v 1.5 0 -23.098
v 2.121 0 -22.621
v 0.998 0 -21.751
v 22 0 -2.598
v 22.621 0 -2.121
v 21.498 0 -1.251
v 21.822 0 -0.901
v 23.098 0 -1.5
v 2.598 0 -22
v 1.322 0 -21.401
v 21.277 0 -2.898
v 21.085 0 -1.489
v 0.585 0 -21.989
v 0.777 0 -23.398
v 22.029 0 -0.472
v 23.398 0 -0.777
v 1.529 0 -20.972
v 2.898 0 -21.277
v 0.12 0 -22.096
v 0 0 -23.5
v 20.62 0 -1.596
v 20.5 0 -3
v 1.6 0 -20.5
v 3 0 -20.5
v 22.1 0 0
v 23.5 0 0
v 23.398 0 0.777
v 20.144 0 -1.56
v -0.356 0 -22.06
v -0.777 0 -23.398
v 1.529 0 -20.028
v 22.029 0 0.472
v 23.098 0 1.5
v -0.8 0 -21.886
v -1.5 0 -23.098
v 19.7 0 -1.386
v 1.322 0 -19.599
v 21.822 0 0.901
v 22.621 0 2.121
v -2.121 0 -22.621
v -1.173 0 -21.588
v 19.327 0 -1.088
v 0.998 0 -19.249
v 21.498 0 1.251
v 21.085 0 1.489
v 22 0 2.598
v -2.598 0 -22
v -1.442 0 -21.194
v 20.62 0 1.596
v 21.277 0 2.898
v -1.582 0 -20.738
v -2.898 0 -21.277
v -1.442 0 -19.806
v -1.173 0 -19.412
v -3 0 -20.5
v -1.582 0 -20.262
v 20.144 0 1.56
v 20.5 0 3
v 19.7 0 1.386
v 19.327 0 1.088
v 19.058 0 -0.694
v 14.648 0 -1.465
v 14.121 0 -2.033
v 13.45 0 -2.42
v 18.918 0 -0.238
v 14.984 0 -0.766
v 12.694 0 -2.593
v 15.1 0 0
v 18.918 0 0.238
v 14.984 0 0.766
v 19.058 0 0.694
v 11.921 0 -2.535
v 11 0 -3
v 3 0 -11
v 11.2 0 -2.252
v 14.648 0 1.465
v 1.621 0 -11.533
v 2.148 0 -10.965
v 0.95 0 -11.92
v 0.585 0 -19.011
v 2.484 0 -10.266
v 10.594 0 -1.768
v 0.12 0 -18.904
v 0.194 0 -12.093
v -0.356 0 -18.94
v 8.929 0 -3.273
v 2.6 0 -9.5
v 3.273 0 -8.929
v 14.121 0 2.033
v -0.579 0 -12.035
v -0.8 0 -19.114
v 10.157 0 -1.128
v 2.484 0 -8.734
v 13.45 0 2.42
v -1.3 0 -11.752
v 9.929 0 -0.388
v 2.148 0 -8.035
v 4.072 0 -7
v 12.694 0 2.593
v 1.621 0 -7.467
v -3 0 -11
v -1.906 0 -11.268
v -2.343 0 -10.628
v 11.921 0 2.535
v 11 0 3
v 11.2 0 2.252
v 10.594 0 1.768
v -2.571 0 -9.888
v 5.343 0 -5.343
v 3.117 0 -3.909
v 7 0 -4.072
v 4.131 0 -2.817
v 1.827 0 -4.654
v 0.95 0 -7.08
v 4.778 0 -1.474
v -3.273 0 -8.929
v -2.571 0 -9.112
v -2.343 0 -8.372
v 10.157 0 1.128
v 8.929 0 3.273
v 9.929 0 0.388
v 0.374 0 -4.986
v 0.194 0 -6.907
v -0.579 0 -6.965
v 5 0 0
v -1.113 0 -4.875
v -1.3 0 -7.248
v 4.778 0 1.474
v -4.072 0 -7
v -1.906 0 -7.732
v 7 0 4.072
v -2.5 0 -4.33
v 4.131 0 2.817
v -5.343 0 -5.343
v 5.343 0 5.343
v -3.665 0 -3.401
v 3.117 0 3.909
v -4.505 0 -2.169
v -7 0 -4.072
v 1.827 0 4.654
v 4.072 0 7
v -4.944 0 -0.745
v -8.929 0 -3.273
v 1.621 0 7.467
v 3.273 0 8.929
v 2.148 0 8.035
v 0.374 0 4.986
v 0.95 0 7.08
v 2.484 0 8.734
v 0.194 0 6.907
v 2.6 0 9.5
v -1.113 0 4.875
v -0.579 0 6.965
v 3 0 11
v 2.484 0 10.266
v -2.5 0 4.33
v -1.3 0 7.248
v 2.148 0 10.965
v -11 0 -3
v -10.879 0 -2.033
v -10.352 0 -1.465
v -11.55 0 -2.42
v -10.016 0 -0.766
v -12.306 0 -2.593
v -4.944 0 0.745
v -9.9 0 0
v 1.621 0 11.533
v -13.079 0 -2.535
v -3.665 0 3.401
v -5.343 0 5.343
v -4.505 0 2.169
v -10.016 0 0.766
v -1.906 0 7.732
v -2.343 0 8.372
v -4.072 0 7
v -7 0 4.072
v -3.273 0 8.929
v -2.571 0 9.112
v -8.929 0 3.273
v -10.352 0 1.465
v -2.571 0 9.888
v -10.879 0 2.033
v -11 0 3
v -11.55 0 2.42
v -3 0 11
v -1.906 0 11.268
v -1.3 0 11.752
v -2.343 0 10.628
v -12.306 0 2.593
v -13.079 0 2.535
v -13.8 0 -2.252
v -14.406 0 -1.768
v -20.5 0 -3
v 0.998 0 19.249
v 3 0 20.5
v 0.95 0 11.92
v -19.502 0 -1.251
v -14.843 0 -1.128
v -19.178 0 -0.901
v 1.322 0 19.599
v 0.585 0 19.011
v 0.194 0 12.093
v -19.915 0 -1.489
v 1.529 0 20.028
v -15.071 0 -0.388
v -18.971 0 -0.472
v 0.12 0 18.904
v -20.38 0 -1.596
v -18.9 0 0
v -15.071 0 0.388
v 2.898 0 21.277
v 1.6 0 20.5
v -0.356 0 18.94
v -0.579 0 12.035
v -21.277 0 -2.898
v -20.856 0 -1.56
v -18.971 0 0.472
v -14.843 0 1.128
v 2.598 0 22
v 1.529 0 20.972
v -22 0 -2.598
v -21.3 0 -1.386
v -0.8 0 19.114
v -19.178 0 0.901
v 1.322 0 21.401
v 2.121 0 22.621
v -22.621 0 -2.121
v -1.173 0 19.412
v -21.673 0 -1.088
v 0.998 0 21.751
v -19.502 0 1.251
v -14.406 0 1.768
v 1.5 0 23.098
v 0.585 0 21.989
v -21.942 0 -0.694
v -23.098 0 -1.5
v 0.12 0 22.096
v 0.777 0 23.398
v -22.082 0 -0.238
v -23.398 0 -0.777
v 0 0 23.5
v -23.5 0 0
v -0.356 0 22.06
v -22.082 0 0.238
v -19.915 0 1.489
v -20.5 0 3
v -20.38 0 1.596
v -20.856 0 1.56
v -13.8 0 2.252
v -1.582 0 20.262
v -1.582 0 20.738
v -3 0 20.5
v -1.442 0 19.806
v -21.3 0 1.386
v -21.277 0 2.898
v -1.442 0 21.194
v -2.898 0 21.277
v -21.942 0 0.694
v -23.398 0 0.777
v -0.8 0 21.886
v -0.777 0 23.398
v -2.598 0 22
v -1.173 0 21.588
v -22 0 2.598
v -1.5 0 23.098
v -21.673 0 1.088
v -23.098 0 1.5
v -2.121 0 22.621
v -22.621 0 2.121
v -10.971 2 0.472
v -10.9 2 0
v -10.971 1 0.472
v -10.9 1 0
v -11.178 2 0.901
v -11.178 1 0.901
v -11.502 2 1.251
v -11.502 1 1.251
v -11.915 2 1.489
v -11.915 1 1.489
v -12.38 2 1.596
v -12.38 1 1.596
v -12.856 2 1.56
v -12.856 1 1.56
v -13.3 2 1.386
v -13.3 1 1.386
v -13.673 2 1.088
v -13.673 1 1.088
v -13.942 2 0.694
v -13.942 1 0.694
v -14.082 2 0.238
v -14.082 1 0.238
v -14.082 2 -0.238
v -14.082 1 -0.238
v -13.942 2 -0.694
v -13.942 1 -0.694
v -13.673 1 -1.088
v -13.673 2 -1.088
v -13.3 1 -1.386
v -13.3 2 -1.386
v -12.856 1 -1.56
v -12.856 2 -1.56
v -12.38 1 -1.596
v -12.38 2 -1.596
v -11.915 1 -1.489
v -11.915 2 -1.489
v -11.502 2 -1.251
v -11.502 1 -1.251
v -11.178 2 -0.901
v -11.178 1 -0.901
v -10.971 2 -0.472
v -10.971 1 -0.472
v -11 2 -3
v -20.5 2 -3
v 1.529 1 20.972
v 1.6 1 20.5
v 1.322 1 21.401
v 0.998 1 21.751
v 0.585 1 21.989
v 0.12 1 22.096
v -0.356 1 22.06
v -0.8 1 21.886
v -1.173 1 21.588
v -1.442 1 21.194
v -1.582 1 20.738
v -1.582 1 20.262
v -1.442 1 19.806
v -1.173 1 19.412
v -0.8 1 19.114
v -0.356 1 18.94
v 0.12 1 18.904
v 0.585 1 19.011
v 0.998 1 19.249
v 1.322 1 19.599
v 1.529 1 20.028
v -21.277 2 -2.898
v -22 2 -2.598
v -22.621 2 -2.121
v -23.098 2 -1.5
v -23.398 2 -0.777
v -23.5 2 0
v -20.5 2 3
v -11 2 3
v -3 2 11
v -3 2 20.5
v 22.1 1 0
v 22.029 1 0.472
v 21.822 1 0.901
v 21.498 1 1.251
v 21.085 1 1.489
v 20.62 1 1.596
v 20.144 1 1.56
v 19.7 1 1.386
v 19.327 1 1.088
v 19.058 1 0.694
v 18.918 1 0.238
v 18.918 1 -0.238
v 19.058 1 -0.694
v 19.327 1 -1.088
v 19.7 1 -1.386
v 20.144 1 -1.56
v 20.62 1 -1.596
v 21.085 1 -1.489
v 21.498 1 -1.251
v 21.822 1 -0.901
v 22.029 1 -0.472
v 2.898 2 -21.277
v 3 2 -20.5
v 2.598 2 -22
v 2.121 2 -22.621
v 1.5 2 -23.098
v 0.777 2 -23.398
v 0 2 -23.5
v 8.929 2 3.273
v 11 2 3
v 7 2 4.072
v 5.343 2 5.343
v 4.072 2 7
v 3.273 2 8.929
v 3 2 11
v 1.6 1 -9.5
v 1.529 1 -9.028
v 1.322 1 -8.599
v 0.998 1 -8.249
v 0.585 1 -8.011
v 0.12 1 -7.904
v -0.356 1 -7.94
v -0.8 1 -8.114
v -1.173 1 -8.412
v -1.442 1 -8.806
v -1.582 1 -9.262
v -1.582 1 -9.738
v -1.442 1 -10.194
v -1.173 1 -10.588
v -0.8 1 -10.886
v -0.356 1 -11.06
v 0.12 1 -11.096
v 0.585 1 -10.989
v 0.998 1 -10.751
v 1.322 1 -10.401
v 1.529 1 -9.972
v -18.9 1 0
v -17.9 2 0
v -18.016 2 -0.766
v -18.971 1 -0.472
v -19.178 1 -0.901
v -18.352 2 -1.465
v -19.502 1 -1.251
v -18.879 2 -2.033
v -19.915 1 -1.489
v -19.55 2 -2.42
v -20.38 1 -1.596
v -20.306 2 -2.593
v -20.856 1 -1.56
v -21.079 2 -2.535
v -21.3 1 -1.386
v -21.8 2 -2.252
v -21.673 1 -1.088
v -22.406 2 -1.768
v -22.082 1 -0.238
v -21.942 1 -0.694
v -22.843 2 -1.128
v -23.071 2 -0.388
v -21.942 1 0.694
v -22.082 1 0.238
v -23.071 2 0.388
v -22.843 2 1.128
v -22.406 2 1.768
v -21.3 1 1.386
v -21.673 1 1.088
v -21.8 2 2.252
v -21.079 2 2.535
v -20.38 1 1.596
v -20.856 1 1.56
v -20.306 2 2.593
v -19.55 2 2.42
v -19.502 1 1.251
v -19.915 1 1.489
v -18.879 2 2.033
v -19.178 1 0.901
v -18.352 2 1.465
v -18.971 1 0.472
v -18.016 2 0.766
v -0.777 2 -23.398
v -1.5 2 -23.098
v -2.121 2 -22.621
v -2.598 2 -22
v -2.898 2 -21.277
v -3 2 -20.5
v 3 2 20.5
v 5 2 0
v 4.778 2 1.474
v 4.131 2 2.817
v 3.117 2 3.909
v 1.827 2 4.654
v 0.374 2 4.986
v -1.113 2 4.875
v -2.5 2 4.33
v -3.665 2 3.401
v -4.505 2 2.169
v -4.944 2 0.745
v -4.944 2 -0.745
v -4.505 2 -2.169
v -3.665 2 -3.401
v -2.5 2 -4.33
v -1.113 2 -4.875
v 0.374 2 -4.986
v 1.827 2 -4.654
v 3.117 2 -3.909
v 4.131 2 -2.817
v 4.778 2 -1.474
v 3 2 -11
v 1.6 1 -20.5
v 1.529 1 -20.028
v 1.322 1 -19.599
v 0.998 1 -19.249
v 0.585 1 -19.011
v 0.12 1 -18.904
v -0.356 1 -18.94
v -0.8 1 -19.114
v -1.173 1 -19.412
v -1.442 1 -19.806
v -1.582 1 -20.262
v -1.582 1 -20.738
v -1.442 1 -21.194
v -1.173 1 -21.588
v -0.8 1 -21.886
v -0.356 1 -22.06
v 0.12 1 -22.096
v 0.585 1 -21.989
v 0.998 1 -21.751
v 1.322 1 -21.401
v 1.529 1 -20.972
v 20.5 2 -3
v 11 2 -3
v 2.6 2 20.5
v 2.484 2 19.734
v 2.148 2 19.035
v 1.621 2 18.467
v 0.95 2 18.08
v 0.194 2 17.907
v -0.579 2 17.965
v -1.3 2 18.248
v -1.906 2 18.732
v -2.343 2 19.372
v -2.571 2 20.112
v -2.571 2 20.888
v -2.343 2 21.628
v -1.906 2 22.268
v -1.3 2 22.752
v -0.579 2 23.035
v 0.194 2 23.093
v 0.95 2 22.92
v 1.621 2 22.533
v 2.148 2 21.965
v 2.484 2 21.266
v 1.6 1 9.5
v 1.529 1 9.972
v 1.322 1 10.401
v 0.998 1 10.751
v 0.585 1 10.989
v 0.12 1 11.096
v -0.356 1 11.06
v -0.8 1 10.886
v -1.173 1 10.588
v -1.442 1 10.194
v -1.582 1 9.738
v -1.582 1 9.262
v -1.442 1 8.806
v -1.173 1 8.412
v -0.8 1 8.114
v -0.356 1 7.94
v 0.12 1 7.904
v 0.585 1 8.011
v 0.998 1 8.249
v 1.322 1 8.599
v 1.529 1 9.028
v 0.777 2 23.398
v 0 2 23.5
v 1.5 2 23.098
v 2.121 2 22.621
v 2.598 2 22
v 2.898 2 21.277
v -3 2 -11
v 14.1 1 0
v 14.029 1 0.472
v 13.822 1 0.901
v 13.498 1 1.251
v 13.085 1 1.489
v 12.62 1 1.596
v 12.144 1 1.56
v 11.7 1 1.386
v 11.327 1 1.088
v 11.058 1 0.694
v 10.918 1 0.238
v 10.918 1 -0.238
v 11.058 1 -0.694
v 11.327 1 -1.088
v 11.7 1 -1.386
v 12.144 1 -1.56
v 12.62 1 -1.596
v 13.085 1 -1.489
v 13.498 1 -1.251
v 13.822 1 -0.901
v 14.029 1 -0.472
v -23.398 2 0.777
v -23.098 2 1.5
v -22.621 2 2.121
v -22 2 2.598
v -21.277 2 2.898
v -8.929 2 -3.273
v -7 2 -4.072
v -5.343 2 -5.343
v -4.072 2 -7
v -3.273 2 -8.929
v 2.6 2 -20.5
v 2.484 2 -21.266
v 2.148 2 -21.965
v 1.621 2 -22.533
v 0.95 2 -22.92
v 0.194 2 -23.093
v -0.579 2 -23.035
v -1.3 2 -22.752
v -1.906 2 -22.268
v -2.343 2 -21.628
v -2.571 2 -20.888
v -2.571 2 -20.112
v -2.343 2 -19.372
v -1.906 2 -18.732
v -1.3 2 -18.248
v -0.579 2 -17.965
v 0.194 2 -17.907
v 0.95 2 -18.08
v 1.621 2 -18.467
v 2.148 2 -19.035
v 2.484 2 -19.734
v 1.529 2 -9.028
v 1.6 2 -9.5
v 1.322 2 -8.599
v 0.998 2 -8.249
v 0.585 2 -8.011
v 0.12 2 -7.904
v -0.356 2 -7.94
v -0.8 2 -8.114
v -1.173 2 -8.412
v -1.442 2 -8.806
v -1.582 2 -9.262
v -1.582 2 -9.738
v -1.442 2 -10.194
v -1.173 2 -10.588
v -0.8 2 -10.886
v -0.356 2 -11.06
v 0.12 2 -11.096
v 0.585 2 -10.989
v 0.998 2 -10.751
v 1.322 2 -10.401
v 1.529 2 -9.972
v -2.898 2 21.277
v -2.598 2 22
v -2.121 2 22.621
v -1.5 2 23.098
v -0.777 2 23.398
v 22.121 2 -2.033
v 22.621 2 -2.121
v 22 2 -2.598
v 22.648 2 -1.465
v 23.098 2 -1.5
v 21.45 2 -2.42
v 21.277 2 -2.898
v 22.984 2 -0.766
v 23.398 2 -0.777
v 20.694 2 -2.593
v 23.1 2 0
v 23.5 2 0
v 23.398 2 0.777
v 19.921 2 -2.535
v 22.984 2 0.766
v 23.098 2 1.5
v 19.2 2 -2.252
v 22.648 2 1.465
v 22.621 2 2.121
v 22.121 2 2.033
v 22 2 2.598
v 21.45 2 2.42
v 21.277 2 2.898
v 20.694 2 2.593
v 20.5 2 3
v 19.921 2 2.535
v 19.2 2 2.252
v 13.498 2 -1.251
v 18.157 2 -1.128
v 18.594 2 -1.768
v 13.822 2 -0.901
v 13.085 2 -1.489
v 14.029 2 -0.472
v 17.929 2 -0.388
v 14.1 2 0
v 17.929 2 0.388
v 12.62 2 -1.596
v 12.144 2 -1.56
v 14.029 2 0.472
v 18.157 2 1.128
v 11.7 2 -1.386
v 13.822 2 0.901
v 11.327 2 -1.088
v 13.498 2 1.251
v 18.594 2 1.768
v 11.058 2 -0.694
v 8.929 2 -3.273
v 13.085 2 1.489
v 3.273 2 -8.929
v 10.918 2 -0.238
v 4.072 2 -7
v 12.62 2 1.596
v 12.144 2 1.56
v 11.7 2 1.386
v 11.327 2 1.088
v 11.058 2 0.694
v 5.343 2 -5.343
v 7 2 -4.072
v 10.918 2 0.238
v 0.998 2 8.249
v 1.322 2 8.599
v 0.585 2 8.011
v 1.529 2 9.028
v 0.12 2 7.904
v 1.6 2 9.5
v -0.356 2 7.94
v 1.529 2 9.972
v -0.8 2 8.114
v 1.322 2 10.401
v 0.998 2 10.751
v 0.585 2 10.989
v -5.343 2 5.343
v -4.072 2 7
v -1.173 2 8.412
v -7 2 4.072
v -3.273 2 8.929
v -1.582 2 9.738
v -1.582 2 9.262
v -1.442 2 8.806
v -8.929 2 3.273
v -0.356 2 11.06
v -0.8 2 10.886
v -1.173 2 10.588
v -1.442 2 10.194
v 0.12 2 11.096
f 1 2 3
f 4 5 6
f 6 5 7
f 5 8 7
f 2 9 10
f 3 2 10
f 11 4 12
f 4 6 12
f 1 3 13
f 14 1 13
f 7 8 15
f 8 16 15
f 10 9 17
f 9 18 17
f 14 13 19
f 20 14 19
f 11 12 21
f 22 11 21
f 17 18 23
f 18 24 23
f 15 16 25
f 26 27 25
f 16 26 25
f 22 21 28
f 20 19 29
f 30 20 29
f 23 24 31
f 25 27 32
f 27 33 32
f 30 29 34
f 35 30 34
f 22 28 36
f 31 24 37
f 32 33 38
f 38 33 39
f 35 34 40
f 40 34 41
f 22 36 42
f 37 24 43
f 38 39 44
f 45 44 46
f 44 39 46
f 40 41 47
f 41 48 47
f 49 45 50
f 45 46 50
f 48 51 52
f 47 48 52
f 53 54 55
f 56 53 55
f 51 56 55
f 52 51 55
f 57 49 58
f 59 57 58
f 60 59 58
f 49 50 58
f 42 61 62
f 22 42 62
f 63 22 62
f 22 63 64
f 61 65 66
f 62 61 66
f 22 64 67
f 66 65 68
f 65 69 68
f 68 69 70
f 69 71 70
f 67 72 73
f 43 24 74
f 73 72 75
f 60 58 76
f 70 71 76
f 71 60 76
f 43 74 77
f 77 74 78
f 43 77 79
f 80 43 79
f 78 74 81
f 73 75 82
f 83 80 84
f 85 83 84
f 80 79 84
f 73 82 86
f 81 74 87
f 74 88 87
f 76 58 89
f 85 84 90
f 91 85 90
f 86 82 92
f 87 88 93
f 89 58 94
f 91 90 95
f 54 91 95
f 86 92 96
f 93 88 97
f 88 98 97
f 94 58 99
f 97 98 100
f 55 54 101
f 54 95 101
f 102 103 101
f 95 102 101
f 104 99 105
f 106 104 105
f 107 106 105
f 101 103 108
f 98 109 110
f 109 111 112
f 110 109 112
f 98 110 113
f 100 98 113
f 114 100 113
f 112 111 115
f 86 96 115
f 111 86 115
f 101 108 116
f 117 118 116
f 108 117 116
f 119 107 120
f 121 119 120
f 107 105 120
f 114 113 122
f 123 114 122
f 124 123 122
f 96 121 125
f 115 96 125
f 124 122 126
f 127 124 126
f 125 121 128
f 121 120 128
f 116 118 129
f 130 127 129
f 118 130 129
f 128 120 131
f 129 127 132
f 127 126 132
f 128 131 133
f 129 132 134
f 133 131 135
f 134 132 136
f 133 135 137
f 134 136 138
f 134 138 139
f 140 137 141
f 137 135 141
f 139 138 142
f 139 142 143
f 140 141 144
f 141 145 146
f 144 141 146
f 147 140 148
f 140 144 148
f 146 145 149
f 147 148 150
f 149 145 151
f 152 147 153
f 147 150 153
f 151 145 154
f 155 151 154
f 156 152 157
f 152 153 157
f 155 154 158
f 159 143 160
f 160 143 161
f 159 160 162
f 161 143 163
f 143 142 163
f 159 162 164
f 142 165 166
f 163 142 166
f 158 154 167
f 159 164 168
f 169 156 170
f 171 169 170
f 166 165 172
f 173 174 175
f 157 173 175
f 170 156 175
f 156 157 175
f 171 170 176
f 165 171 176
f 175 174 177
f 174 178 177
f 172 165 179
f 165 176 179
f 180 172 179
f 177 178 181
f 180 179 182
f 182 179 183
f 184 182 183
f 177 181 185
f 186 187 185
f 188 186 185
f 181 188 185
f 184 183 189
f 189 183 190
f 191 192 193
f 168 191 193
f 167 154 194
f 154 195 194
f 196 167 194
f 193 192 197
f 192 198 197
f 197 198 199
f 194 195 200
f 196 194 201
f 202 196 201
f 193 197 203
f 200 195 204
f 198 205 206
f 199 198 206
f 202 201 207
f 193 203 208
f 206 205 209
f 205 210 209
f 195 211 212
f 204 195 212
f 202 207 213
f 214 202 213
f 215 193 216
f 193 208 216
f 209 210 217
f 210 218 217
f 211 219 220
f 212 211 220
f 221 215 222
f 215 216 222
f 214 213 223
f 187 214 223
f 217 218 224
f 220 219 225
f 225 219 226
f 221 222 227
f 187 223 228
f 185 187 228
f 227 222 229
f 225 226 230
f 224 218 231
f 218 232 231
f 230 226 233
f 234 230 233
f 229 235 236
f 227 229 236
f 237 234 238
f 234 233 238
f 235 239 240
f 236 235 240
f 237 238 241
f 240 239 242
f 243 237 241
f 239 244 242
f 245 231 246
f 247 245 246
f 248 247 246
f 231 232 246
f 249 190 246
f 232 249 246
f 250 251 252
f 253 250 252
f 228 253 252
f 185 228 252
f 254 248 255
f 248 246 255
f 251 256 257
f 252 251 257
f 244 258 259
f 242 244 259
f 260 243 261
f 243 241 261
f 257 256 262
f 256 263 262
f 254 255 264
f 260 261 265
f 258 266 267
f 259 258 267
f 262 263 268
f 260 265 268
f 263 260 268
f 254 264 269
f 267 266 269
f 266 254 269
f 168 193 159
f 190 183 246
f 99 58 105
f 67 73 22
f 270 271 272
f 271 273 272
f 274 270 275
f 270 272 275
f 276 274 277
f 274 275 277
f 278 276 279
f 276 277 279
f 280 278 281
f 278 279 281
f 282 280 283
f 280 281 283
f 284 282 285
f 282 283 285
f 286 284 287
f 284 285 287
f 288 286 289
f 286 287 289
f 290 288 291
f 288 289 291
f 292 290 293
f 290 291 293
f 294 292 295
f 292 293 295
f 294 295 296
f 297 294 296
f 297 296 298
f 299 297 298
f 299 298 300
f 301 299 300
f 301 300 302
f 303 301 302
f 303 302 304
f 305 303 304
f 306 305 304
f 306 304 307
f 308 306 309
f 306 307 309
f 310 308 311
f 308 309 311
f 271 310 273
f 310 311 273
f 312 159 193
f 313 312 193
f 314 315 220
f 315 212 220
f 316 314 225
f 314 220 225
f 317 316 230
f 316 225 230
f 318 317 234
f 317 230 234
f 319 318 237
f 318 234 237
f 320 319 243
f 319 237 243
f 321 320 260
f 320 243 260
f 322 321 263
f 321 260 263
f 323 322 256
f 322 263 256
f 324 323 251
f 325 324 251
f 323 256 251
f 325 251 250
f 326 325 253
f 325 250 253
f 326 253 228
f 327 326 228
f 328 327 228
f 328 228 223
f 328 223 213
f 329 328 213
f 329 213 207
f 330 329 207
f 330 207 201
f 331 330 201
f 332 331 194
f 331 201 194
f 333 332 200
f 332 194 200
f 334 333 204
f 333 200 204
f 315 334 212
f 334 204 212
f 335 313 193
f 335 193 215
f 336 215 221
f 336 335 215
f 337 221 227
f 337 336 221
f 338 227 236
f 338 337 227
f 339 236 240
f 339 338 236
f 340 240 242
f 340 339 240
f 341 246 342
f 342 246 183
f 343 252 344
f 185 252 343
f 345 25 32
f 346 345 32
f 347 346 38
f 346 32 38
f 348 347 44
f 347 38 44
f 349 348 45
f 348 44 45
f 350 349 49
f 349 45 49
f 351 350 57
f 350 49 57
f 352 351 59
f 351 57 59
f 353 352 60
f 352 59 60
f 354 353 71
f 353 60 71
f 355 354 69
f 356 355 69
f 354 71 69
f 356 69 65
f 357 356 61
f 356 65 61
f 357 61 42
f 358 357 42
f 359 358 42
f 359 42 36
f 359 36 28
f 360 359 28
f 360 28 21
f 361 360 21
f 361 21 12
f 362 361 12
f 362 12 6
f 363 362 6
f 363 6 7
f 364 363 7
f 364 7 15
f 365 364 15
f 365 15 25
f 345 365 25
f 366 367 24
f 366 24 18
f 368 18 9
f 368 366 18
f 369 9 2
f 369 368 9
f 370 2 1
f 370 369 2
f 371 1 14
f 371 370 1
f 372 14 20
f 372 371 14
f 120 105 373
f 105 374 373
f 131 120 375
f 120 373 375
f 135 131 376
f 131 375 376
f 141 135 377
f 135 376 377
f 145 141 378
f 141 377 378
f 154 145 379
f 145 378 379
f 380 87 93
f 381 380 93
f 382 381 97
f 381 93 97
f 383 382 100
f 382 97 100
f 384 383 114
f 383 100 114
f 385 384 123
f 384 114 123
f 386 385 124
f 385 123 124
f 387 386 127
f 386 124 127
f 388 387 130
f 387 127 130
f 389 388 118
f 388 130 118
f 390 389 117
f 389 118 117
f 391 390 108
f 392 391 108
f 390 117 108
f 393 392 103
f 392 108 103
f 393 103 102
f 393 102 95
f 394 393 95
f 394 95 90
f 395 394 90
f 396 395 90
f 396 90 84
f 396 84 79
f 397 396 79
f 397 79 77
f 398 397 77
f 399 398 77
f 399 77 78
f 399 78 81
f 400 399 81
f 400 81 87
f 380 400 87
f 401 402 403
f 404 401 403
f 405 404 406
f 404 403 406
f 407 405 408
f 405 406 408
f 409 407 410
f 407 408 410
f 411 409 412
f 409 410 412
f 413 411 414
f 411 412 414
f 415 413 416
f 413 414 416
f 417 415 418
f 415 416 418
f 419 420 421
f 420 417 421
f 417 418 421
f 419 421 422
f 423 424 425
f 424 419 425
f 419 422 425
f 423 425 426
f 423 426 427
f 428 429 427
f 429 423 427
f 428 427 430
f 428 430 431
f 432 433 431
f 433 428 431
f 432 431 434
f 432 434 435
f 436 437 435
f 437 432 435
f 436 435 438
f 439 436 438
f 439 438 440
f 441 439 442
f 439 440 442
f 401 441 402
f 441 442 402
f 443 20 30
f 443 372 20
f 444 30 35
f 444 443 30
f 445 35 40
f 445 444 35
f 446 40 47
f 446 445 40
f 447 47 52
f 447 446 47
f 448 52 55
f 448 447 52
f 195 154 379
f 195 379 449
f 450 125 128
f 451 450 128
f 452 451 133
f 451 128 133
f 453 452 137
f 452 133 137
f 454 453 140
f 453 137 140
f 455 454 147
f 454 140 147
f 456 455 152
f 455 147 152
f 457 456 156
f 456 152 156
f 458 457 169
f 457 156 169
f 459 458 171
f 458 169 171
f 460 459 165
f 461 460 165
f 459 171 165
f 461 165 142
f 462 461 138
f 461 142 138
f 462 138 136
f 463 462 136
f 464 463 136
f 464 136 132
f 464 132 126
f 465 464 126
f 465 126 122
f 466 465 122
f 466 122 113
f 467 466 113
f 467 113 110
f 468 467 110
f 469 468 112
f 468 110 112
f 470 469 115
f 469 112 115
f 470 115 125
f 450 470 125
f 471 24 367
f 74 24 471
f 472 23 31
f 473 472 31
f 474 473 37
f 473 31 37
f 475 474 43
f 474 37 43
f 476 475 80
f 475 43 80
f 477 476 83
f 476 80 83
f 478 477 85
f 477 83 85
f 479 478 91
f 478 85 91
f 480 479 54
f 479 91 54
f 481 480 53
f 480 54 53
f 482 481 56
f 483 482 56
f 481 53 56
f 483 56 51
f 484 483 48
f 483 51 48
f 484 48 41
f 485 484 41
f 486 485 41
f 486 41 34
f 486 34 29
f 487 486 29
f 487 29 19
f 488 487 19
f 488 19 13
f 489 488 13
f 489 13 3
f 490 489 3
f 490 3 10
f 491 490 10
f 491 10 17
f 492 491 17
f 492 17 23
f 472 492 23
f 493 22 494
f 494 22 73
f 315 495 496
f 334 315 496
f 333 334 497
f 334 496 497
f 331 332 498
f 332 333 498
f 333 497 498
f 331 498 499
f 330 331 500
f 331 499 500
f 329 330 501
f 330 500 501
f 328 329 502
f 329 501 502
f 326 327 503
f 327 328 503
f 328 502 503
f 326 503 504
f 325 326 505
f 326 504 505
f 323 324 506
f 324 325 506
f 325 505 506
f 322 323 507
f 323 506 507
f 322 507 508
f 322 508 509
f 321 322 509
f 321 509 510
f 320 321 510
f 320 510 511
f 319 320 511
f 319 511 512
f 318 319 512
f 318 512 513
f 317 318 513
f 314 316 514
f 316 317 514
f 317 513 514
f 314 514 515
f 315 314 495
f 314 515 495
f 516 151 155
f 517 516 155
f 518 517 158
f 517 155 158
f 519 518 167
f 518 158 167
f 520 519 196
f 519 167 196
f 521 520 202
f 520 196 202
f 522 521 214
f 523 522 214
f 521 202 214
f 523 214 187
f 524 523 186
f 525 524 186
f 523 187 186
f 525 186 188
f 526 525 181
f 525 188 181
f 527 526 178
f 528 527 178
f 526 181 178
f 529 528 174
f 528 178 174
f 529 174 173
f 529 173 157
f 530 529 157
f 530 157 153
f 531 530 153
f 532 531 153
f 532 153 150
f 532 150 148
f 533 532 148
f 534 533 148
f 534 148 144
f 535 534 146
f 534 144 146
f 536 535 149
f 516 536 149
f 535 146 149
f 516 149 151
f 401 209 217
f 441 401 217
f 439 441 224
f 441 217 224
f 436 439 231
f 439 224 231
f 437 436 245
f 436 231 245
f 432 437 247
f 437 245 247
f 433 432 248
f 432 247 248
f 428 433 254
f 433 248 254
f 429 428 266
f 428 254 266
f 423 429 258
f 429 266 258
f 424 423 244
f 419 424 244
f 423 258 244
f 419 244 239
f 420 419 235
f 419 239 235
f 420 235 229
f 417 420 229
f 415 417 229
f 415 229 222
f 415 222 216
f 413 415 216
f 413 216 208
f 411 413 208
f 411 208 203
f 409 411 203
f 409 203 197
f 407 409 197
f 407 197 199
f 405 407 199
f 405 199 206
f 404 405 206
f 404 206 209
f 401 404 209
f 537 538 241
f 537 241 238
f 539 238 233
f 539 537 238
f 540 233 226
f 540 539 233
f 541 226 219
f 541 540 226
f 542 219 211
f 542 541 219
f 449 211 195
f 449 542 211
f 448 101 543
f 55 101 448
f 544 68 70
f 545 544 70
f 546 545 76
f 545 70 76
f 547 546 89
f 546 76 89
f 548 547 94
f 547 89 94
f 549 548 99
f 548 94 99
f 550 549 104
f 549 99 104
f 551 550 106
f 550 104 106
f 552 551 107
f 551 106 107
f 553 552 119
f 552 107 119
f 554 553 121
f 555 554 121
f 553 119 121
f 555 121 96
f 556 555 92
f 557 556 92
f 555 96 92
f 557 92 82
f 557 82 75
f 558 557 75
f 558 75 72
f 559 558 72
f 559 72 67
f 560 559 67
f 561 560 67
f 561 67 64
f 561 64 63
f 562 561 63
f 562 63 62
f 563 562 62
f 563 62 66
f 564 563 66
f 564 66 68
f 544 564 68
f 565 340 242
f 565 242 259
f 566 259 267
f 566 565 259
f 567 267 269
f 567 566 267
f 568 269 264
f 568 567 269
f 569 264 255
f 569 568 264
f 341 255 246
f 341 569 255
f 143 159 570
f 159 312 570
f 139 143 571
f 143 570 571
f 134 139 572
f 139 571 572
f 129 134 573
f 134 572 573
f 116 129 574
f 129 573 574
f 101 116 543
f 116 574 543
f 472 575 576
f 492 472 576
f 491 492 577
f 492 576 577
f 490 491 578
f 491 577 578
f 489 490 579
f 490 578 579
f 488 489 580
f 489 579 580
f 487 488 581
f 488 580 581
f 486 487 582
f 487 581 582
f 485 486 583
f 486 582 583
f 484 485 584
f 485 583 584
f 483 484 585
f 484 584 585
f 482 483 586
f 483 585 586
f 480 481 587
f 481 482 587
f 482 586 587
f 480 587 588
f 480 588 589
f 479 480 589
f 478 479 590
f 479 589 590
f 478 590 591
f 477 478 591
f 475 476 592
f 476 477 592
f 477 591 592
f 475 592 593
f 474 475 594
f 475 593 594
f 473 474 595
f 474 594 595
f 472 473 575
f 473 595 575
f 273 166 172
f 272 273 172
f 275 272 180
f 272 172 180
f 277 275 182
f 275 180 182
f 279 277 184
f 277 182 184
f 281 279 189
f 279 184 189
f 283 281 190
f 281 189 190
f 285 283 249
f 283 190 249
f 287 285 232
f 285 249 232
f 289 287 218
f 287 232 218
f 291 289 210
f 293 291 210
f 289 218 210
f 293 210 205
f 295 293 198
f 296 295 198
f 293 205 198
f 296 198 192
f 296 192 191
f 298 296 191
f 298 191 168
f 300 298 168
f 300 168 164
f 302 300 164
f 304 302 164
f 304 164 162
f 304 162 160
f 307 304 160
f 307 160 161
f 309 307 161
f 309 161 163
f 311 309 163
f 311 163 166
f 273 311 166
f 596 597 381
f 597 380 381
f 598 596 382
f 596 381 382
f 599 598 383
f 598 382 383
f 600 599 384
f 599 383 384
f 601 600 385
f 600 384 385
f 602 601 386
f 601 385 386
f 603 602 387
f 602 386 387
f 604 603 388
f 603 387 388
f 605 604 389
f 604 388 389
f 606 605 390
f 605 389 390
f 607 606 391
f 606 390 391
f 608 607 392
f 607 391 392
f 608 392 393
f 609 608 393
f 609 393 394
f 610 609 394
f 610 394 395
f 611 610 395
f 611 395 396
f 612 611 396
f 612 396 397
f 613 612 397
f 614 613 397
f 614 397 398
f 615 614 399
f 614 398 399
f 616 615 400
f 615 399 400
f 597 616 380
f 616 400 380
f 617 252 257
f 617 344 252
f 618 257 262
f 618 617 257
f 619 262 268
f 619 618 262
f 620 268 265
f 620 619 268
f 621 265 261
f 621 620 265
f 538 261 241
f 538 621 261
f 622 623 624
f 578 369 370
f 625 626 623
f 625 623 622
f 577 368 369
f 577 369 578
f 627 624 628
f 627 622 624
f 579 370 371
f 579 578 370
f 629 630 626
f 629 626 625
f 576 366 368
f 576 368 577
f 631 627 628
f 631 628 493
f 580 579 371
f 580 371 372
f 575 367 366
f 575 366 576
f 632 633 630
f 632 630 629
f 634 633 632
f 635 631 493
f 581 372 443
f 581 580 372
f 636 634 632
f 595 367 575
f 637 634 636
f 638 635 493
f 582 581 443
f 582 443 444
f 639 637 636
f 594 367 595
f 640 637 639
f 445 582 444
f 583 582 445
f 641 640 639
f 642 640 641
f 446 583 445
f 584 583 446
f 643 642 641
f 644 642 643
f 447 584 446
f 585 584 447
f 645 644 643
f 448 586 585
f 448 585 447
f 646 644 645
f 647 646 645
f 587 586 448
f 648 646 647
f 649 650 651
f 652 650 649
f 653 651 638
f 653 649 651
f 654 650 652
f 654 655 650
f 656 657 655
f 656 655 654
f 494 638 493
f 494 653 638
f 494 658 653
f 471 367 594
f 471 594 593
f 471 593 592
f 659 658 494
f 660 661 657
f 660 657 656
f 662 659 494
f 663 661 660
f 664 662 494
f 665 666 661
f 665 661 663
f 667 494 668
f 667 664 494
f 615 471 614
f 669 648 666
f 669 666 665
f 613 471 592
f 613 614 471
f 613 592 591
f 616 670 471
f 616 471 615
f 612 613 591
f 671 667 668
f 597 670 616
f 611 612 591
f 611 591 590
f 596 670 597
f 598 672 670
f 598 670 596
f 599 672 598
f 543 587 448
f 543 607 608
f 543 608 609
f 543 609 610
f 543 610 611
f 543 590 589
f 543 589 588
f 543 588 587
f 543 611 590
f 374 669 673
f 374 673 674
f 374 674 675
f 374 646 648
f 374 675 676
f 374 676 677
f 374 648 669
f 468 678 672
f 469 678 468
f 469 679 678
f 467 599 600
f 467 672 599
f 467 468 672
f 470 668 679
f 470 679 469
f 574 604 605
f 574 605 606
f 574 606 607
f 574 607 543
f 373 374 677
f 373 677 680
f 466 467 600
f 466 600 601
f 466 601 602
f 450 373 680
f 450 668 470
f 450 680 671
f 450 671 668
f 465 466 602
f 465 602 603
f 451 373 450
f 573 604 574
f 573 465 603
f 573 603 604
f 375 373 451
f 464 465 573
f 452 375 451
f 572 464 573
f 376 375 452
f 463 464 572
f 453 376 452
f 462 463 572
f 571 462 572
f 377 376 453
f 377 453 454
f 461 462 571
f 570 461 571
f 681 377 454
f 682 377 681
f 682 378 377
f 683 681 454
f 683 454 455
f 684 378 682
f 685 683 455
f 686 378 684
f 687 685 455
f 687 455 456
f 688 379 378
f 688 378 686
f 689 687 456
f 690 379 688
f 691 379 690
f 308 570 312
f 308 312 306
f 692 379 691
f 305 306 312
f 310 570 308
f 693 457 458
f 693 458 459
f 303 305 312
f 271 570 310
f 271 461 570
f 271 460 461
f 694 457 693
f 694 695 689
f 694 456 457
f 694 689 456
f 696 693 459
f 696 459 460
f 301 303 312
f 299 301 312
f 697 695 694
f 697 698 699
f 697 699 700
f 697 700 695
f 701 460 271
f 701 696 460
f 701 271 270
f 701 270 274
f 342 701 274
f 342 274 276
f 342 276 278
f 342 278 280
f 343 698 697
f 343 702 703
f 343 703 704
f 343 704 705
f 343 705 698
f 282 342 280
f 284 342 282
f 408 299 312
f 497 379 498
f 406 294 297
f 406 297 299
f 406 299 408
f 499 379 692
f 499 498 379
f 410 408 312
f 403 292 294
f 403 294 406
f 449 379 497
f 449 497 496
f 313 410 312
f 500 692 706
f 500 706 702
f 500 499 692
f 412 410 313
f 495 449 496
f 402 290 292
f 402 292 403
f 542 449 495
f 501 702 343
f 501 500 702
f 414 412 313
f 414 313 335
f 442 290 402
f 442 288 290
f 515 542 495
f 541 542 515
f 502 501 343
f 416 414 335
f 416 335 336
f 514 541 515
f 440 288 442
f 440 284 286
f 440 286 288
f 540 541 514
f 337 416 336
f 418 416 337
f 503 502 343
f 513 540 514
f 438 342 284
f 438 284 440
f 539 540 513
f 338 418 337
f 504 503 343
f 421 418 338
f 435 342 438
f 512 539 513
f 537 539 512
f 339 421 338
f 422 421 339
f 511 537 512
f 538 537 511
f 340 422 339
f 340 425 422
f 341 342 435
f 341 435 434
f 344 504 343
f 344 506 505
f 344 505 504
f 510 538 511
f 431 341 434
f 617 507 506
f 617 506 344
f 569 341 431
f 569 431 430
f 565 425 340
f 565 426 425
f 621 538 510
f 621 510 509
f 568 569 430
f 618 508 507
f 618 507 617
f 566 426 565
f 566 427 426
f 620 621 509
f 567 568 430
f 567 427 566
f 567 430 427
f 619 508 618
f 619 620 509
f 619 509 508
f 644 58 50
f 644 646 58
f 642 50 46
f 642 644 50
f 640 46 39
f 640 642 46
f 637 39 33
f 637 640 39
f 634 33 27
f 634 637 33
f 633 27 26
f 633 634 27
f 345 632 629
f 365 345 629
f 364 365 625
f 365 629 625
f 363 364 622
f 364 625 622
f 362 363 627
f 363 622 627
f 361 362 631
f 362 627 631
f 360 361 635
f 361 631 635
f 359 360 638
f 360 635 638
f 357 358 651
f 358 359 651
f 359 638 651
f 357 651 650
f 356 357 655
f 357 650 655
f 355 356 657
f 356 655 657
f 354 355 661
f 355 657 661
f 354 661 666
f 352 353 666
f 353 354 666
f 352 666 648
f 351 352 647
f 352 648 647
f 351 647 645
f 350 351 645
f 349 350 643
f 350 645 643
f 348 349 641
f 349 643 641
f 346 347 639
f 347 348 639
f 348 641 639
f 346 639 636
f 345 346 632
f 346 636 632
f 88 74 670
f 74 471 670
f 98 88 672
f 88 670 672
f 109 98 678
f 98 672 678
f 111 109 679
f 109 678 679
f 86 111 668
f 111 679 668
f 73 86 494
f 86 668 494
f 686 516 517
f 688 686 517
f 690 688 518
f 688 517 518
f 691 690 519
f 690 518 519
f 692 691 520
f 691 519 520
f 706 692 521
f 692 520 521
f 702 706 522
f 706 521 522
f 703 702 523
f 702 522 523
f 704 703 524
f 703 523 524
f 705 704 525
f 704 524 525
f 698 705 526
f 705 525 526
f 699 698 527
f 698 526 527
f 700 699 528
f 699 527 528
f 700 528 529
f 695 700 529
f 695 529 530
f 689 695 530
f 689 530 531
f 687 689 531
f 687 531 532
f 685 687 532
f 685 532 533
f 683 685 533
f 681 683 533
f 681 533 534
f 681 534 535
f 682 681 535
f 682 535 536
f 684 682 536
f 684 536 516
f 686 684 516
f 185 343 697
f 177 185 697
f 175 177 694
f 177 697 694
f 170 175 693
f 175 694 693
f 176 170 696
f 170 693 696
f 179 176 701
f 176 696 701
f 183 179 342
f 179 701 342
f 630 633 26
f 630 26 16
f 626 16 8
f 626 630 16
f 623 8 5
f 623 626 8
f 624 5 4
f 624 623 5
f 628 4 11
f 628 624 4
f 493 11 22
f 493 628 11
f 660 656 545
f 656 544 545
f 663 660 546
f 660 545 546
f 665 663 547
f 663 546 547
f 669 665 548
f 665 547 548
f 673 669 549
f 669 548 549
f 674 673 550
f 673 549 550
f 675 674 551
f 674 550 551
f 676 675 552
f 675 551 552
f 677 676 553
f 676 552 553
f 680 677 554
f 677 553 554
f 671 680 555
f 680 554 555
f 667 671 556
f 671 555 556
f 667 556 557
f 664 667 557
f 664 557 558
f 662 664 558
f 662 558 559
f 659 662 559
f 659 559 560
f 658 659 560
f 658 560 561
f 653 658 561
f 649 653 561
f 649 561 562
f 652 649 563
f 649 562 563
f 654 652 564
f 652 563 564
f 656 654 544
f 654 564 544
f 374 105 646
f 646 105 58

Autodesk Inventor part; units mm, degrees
ref_plane "YZ Plane" through (0, 0, 0) normal (1, 0, 0) x (0, 1, 0)
ref_plane "XZ Plane" through (0, 0, 0) normal (0, 1, 0) x (-1, 0, 0)
ref_plane "XY Plane" through (0, 0, 0) normal (0, 0, 1) x (1, 0, 0)
sketch "Skizze1" plane through (0, 0, 0) normal (0, 1, 0) x (-1, 0, 0)
  line L0 (-23.5, -3) -> (23.5, -3)
  line L1 (23.5, -3) -> (23.5, 3)
  line L2 (23.5, 3) -> (-23.5, 3)
  line L3 (-23.5, 3) -> (-23.5, -3)
  line L4 (-23.5, -3) -> (23.5, 3) construction
  line L5 (23.5, -3) -> (-23.5, 3) construction
  line L6 (3, -23.5) -> (-3, -23.5)
  line L7 (-3, -23.5) -> (-3, 23.5)
  line L8 (-3, 23.5) -> (3, 23.5)
  line L9 (3, 23.5) -> (3, -23.5)
  line L10 (3, -23.5) -> (-3, 23.5) construction
  line L11 (-3, -23.5) -> (3, 23.5) construction
  point P0 (0, 0)
  dimension "d0" = 6
  dimension "d1" = 47
extrude "Extrusion1" add sketch "Skizze1" along normal blind 2
sketch "Skizze2" plane through (0, 0, 0) normal (0, -1, 0) x (1, 0, 0)
  circle A0 centre (0, 20.5) radius 1.6
  circle A1 centre (0, -20.5) radius 1.6
  circle A2 centre (20.5, 0) radius 1.6
  circle A3 centre (-20.5, 0) radius 1.6
  line L0 (0, 20.5) -> (0, -20.5) construction
  line L1 (3, -3) -> (3, -23.5) construction
  line L2 (20.5, 0) -> (-20.5, 0) construction
  circle A4 centre (0, 9.5) radius 1.6
  circle A5 centre (0, -9.5) radius 1.6
  circle A6 centre (12.5, 0) radius 1.6
  circle A7 centre (-12.5, 0) radius 1.6
  line L3 (0, 9.5) -> (0, -9.5) construction
  line L4 (12.5, 0) -> (-12.5, 0) construction
  point P0 (0, 0)
  point P1 (0, 0)
  dimension "d4" = 3.2
  dimension "d5" = 41
  dimension "d7" = 19
  dimension "d8" = 25
extrude "Extrusion2" cut sketch "Skizze2" against normal blind 2
fillet "Rundung1" radius 3 8 edges at (-3, 1, 23.5) (3, 1, 23.5) (23.5, 1, 3) (23.5, 1, -3) (3, 1, -23.5) (-3, 1, -23.5) (-23.5, 1, -3) (-23.5, 1, 3)
fillet "Rundung2" radius 8 4 edges at (3, 1, 3) (-3, 1, 3) (-3, 1, -3) (3, 1, -3)
sketch "Skizze3" plane through (0, 0, 0) normal (0, -1, 0) x (1, 0, 0)
  circle A0 centre (0, 0) radius 5
  dimension "d13" = 10
extrude "Extrusion3" cut sketch "Skizze3" against normal blind 2
chamfer "Fase1" distance 1 angle 45 8 edges at (-1.6, 0, 9.5) (-14.1, 0, 0) (10.9, 0, 0) (-1.6, 0, -9.5) (-1.6, 2, 20.5) (-22.1, 2, 0) (18.9, 2, 0) (-1.6, 2, -20.5)
equation "\"G_L\" = 0"
equation "\"G_H\" = 0"
equation "\"G_B\" = 0"
properties part number "Motorkreuz" material "GEDA Stahl"
